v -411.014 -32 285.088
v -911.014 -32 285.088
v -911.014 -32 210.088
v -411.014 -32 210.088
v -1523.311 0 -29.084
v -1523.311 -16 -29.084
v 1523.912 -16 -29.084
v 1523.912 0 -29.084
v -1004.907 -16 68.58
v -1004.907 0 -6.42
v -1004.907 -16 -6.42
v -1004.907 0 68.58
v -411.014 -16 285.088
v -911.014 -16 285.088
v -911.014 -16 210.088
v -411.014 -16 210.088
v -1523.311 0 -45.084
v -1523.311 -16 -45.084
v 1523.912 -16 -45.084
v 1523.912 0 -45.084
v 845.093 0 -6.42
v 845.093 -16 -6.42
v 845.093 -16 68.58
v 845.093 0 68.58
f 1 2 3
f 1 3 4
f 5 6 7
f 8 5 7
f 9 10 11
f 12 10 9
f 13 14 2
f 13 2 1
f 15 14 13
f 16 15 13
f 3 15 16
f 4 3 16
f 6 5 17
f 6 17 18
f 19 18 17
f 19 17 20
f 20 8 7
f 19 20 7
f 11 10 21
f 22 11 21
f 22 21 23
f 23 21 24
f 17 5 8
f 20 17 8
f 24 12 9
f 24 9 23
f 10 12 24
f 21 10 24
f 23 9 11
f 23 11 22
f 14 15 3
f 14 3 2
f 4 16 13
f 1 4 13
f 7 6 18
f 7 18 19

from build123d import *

# Parameters (mm, degrees)
F1_E0_TOP_W = 3047.2222391173
F1_E0_TOP_H = 16
F3_DEPTH    = 16
F6_W        = 1850
F6_H        = 75
F7_DEPTH    = 16
F8_W        = 500
F8_H        = 75
F9_DEPTH    = 16


# Not quite as in the source:
# - the program builds the solid bodies; features that only make, move or delete a surface that nothing else refers to are left out


with BuildPart() as f3:
    # F1_E0_top (on explicit) → F3 (new body)
    with BuildSketch(Plane(origin=(-1523.3105482362, 0, -29.0839689784), x_dir=(1, 0, 0), z_dir=(0, 0, -1))):
        with Locations((1523.6111195587, 8)):
            Rectangle(F1_E0_TOP_W, F1_E0_TOP_H)
    extrude(amount=F3_DEPTH)


with BuildPart() as f7:
    # F6 (on Front) → F7 (new body)
    with BuildSketch(Plane.XZ):
        with Locations((-79.9069583416, 31.0795101923)):
            Rectangle(F6_W, F6_H)
    extrude(amount=F7_DEPTH)


with BuildPart() as f9:
    # F8 (on face) → F9 (new body)
    with BuildSketch(Plane.XZ.offset(16)):
        with Locations((-661.014303565, 247.5882079988)):
            Rectangle(F8_W, F8_H)
    extrude(amount=F9_DEPTH)


solid = Compound([f3.part, f7.part, f9.part])
